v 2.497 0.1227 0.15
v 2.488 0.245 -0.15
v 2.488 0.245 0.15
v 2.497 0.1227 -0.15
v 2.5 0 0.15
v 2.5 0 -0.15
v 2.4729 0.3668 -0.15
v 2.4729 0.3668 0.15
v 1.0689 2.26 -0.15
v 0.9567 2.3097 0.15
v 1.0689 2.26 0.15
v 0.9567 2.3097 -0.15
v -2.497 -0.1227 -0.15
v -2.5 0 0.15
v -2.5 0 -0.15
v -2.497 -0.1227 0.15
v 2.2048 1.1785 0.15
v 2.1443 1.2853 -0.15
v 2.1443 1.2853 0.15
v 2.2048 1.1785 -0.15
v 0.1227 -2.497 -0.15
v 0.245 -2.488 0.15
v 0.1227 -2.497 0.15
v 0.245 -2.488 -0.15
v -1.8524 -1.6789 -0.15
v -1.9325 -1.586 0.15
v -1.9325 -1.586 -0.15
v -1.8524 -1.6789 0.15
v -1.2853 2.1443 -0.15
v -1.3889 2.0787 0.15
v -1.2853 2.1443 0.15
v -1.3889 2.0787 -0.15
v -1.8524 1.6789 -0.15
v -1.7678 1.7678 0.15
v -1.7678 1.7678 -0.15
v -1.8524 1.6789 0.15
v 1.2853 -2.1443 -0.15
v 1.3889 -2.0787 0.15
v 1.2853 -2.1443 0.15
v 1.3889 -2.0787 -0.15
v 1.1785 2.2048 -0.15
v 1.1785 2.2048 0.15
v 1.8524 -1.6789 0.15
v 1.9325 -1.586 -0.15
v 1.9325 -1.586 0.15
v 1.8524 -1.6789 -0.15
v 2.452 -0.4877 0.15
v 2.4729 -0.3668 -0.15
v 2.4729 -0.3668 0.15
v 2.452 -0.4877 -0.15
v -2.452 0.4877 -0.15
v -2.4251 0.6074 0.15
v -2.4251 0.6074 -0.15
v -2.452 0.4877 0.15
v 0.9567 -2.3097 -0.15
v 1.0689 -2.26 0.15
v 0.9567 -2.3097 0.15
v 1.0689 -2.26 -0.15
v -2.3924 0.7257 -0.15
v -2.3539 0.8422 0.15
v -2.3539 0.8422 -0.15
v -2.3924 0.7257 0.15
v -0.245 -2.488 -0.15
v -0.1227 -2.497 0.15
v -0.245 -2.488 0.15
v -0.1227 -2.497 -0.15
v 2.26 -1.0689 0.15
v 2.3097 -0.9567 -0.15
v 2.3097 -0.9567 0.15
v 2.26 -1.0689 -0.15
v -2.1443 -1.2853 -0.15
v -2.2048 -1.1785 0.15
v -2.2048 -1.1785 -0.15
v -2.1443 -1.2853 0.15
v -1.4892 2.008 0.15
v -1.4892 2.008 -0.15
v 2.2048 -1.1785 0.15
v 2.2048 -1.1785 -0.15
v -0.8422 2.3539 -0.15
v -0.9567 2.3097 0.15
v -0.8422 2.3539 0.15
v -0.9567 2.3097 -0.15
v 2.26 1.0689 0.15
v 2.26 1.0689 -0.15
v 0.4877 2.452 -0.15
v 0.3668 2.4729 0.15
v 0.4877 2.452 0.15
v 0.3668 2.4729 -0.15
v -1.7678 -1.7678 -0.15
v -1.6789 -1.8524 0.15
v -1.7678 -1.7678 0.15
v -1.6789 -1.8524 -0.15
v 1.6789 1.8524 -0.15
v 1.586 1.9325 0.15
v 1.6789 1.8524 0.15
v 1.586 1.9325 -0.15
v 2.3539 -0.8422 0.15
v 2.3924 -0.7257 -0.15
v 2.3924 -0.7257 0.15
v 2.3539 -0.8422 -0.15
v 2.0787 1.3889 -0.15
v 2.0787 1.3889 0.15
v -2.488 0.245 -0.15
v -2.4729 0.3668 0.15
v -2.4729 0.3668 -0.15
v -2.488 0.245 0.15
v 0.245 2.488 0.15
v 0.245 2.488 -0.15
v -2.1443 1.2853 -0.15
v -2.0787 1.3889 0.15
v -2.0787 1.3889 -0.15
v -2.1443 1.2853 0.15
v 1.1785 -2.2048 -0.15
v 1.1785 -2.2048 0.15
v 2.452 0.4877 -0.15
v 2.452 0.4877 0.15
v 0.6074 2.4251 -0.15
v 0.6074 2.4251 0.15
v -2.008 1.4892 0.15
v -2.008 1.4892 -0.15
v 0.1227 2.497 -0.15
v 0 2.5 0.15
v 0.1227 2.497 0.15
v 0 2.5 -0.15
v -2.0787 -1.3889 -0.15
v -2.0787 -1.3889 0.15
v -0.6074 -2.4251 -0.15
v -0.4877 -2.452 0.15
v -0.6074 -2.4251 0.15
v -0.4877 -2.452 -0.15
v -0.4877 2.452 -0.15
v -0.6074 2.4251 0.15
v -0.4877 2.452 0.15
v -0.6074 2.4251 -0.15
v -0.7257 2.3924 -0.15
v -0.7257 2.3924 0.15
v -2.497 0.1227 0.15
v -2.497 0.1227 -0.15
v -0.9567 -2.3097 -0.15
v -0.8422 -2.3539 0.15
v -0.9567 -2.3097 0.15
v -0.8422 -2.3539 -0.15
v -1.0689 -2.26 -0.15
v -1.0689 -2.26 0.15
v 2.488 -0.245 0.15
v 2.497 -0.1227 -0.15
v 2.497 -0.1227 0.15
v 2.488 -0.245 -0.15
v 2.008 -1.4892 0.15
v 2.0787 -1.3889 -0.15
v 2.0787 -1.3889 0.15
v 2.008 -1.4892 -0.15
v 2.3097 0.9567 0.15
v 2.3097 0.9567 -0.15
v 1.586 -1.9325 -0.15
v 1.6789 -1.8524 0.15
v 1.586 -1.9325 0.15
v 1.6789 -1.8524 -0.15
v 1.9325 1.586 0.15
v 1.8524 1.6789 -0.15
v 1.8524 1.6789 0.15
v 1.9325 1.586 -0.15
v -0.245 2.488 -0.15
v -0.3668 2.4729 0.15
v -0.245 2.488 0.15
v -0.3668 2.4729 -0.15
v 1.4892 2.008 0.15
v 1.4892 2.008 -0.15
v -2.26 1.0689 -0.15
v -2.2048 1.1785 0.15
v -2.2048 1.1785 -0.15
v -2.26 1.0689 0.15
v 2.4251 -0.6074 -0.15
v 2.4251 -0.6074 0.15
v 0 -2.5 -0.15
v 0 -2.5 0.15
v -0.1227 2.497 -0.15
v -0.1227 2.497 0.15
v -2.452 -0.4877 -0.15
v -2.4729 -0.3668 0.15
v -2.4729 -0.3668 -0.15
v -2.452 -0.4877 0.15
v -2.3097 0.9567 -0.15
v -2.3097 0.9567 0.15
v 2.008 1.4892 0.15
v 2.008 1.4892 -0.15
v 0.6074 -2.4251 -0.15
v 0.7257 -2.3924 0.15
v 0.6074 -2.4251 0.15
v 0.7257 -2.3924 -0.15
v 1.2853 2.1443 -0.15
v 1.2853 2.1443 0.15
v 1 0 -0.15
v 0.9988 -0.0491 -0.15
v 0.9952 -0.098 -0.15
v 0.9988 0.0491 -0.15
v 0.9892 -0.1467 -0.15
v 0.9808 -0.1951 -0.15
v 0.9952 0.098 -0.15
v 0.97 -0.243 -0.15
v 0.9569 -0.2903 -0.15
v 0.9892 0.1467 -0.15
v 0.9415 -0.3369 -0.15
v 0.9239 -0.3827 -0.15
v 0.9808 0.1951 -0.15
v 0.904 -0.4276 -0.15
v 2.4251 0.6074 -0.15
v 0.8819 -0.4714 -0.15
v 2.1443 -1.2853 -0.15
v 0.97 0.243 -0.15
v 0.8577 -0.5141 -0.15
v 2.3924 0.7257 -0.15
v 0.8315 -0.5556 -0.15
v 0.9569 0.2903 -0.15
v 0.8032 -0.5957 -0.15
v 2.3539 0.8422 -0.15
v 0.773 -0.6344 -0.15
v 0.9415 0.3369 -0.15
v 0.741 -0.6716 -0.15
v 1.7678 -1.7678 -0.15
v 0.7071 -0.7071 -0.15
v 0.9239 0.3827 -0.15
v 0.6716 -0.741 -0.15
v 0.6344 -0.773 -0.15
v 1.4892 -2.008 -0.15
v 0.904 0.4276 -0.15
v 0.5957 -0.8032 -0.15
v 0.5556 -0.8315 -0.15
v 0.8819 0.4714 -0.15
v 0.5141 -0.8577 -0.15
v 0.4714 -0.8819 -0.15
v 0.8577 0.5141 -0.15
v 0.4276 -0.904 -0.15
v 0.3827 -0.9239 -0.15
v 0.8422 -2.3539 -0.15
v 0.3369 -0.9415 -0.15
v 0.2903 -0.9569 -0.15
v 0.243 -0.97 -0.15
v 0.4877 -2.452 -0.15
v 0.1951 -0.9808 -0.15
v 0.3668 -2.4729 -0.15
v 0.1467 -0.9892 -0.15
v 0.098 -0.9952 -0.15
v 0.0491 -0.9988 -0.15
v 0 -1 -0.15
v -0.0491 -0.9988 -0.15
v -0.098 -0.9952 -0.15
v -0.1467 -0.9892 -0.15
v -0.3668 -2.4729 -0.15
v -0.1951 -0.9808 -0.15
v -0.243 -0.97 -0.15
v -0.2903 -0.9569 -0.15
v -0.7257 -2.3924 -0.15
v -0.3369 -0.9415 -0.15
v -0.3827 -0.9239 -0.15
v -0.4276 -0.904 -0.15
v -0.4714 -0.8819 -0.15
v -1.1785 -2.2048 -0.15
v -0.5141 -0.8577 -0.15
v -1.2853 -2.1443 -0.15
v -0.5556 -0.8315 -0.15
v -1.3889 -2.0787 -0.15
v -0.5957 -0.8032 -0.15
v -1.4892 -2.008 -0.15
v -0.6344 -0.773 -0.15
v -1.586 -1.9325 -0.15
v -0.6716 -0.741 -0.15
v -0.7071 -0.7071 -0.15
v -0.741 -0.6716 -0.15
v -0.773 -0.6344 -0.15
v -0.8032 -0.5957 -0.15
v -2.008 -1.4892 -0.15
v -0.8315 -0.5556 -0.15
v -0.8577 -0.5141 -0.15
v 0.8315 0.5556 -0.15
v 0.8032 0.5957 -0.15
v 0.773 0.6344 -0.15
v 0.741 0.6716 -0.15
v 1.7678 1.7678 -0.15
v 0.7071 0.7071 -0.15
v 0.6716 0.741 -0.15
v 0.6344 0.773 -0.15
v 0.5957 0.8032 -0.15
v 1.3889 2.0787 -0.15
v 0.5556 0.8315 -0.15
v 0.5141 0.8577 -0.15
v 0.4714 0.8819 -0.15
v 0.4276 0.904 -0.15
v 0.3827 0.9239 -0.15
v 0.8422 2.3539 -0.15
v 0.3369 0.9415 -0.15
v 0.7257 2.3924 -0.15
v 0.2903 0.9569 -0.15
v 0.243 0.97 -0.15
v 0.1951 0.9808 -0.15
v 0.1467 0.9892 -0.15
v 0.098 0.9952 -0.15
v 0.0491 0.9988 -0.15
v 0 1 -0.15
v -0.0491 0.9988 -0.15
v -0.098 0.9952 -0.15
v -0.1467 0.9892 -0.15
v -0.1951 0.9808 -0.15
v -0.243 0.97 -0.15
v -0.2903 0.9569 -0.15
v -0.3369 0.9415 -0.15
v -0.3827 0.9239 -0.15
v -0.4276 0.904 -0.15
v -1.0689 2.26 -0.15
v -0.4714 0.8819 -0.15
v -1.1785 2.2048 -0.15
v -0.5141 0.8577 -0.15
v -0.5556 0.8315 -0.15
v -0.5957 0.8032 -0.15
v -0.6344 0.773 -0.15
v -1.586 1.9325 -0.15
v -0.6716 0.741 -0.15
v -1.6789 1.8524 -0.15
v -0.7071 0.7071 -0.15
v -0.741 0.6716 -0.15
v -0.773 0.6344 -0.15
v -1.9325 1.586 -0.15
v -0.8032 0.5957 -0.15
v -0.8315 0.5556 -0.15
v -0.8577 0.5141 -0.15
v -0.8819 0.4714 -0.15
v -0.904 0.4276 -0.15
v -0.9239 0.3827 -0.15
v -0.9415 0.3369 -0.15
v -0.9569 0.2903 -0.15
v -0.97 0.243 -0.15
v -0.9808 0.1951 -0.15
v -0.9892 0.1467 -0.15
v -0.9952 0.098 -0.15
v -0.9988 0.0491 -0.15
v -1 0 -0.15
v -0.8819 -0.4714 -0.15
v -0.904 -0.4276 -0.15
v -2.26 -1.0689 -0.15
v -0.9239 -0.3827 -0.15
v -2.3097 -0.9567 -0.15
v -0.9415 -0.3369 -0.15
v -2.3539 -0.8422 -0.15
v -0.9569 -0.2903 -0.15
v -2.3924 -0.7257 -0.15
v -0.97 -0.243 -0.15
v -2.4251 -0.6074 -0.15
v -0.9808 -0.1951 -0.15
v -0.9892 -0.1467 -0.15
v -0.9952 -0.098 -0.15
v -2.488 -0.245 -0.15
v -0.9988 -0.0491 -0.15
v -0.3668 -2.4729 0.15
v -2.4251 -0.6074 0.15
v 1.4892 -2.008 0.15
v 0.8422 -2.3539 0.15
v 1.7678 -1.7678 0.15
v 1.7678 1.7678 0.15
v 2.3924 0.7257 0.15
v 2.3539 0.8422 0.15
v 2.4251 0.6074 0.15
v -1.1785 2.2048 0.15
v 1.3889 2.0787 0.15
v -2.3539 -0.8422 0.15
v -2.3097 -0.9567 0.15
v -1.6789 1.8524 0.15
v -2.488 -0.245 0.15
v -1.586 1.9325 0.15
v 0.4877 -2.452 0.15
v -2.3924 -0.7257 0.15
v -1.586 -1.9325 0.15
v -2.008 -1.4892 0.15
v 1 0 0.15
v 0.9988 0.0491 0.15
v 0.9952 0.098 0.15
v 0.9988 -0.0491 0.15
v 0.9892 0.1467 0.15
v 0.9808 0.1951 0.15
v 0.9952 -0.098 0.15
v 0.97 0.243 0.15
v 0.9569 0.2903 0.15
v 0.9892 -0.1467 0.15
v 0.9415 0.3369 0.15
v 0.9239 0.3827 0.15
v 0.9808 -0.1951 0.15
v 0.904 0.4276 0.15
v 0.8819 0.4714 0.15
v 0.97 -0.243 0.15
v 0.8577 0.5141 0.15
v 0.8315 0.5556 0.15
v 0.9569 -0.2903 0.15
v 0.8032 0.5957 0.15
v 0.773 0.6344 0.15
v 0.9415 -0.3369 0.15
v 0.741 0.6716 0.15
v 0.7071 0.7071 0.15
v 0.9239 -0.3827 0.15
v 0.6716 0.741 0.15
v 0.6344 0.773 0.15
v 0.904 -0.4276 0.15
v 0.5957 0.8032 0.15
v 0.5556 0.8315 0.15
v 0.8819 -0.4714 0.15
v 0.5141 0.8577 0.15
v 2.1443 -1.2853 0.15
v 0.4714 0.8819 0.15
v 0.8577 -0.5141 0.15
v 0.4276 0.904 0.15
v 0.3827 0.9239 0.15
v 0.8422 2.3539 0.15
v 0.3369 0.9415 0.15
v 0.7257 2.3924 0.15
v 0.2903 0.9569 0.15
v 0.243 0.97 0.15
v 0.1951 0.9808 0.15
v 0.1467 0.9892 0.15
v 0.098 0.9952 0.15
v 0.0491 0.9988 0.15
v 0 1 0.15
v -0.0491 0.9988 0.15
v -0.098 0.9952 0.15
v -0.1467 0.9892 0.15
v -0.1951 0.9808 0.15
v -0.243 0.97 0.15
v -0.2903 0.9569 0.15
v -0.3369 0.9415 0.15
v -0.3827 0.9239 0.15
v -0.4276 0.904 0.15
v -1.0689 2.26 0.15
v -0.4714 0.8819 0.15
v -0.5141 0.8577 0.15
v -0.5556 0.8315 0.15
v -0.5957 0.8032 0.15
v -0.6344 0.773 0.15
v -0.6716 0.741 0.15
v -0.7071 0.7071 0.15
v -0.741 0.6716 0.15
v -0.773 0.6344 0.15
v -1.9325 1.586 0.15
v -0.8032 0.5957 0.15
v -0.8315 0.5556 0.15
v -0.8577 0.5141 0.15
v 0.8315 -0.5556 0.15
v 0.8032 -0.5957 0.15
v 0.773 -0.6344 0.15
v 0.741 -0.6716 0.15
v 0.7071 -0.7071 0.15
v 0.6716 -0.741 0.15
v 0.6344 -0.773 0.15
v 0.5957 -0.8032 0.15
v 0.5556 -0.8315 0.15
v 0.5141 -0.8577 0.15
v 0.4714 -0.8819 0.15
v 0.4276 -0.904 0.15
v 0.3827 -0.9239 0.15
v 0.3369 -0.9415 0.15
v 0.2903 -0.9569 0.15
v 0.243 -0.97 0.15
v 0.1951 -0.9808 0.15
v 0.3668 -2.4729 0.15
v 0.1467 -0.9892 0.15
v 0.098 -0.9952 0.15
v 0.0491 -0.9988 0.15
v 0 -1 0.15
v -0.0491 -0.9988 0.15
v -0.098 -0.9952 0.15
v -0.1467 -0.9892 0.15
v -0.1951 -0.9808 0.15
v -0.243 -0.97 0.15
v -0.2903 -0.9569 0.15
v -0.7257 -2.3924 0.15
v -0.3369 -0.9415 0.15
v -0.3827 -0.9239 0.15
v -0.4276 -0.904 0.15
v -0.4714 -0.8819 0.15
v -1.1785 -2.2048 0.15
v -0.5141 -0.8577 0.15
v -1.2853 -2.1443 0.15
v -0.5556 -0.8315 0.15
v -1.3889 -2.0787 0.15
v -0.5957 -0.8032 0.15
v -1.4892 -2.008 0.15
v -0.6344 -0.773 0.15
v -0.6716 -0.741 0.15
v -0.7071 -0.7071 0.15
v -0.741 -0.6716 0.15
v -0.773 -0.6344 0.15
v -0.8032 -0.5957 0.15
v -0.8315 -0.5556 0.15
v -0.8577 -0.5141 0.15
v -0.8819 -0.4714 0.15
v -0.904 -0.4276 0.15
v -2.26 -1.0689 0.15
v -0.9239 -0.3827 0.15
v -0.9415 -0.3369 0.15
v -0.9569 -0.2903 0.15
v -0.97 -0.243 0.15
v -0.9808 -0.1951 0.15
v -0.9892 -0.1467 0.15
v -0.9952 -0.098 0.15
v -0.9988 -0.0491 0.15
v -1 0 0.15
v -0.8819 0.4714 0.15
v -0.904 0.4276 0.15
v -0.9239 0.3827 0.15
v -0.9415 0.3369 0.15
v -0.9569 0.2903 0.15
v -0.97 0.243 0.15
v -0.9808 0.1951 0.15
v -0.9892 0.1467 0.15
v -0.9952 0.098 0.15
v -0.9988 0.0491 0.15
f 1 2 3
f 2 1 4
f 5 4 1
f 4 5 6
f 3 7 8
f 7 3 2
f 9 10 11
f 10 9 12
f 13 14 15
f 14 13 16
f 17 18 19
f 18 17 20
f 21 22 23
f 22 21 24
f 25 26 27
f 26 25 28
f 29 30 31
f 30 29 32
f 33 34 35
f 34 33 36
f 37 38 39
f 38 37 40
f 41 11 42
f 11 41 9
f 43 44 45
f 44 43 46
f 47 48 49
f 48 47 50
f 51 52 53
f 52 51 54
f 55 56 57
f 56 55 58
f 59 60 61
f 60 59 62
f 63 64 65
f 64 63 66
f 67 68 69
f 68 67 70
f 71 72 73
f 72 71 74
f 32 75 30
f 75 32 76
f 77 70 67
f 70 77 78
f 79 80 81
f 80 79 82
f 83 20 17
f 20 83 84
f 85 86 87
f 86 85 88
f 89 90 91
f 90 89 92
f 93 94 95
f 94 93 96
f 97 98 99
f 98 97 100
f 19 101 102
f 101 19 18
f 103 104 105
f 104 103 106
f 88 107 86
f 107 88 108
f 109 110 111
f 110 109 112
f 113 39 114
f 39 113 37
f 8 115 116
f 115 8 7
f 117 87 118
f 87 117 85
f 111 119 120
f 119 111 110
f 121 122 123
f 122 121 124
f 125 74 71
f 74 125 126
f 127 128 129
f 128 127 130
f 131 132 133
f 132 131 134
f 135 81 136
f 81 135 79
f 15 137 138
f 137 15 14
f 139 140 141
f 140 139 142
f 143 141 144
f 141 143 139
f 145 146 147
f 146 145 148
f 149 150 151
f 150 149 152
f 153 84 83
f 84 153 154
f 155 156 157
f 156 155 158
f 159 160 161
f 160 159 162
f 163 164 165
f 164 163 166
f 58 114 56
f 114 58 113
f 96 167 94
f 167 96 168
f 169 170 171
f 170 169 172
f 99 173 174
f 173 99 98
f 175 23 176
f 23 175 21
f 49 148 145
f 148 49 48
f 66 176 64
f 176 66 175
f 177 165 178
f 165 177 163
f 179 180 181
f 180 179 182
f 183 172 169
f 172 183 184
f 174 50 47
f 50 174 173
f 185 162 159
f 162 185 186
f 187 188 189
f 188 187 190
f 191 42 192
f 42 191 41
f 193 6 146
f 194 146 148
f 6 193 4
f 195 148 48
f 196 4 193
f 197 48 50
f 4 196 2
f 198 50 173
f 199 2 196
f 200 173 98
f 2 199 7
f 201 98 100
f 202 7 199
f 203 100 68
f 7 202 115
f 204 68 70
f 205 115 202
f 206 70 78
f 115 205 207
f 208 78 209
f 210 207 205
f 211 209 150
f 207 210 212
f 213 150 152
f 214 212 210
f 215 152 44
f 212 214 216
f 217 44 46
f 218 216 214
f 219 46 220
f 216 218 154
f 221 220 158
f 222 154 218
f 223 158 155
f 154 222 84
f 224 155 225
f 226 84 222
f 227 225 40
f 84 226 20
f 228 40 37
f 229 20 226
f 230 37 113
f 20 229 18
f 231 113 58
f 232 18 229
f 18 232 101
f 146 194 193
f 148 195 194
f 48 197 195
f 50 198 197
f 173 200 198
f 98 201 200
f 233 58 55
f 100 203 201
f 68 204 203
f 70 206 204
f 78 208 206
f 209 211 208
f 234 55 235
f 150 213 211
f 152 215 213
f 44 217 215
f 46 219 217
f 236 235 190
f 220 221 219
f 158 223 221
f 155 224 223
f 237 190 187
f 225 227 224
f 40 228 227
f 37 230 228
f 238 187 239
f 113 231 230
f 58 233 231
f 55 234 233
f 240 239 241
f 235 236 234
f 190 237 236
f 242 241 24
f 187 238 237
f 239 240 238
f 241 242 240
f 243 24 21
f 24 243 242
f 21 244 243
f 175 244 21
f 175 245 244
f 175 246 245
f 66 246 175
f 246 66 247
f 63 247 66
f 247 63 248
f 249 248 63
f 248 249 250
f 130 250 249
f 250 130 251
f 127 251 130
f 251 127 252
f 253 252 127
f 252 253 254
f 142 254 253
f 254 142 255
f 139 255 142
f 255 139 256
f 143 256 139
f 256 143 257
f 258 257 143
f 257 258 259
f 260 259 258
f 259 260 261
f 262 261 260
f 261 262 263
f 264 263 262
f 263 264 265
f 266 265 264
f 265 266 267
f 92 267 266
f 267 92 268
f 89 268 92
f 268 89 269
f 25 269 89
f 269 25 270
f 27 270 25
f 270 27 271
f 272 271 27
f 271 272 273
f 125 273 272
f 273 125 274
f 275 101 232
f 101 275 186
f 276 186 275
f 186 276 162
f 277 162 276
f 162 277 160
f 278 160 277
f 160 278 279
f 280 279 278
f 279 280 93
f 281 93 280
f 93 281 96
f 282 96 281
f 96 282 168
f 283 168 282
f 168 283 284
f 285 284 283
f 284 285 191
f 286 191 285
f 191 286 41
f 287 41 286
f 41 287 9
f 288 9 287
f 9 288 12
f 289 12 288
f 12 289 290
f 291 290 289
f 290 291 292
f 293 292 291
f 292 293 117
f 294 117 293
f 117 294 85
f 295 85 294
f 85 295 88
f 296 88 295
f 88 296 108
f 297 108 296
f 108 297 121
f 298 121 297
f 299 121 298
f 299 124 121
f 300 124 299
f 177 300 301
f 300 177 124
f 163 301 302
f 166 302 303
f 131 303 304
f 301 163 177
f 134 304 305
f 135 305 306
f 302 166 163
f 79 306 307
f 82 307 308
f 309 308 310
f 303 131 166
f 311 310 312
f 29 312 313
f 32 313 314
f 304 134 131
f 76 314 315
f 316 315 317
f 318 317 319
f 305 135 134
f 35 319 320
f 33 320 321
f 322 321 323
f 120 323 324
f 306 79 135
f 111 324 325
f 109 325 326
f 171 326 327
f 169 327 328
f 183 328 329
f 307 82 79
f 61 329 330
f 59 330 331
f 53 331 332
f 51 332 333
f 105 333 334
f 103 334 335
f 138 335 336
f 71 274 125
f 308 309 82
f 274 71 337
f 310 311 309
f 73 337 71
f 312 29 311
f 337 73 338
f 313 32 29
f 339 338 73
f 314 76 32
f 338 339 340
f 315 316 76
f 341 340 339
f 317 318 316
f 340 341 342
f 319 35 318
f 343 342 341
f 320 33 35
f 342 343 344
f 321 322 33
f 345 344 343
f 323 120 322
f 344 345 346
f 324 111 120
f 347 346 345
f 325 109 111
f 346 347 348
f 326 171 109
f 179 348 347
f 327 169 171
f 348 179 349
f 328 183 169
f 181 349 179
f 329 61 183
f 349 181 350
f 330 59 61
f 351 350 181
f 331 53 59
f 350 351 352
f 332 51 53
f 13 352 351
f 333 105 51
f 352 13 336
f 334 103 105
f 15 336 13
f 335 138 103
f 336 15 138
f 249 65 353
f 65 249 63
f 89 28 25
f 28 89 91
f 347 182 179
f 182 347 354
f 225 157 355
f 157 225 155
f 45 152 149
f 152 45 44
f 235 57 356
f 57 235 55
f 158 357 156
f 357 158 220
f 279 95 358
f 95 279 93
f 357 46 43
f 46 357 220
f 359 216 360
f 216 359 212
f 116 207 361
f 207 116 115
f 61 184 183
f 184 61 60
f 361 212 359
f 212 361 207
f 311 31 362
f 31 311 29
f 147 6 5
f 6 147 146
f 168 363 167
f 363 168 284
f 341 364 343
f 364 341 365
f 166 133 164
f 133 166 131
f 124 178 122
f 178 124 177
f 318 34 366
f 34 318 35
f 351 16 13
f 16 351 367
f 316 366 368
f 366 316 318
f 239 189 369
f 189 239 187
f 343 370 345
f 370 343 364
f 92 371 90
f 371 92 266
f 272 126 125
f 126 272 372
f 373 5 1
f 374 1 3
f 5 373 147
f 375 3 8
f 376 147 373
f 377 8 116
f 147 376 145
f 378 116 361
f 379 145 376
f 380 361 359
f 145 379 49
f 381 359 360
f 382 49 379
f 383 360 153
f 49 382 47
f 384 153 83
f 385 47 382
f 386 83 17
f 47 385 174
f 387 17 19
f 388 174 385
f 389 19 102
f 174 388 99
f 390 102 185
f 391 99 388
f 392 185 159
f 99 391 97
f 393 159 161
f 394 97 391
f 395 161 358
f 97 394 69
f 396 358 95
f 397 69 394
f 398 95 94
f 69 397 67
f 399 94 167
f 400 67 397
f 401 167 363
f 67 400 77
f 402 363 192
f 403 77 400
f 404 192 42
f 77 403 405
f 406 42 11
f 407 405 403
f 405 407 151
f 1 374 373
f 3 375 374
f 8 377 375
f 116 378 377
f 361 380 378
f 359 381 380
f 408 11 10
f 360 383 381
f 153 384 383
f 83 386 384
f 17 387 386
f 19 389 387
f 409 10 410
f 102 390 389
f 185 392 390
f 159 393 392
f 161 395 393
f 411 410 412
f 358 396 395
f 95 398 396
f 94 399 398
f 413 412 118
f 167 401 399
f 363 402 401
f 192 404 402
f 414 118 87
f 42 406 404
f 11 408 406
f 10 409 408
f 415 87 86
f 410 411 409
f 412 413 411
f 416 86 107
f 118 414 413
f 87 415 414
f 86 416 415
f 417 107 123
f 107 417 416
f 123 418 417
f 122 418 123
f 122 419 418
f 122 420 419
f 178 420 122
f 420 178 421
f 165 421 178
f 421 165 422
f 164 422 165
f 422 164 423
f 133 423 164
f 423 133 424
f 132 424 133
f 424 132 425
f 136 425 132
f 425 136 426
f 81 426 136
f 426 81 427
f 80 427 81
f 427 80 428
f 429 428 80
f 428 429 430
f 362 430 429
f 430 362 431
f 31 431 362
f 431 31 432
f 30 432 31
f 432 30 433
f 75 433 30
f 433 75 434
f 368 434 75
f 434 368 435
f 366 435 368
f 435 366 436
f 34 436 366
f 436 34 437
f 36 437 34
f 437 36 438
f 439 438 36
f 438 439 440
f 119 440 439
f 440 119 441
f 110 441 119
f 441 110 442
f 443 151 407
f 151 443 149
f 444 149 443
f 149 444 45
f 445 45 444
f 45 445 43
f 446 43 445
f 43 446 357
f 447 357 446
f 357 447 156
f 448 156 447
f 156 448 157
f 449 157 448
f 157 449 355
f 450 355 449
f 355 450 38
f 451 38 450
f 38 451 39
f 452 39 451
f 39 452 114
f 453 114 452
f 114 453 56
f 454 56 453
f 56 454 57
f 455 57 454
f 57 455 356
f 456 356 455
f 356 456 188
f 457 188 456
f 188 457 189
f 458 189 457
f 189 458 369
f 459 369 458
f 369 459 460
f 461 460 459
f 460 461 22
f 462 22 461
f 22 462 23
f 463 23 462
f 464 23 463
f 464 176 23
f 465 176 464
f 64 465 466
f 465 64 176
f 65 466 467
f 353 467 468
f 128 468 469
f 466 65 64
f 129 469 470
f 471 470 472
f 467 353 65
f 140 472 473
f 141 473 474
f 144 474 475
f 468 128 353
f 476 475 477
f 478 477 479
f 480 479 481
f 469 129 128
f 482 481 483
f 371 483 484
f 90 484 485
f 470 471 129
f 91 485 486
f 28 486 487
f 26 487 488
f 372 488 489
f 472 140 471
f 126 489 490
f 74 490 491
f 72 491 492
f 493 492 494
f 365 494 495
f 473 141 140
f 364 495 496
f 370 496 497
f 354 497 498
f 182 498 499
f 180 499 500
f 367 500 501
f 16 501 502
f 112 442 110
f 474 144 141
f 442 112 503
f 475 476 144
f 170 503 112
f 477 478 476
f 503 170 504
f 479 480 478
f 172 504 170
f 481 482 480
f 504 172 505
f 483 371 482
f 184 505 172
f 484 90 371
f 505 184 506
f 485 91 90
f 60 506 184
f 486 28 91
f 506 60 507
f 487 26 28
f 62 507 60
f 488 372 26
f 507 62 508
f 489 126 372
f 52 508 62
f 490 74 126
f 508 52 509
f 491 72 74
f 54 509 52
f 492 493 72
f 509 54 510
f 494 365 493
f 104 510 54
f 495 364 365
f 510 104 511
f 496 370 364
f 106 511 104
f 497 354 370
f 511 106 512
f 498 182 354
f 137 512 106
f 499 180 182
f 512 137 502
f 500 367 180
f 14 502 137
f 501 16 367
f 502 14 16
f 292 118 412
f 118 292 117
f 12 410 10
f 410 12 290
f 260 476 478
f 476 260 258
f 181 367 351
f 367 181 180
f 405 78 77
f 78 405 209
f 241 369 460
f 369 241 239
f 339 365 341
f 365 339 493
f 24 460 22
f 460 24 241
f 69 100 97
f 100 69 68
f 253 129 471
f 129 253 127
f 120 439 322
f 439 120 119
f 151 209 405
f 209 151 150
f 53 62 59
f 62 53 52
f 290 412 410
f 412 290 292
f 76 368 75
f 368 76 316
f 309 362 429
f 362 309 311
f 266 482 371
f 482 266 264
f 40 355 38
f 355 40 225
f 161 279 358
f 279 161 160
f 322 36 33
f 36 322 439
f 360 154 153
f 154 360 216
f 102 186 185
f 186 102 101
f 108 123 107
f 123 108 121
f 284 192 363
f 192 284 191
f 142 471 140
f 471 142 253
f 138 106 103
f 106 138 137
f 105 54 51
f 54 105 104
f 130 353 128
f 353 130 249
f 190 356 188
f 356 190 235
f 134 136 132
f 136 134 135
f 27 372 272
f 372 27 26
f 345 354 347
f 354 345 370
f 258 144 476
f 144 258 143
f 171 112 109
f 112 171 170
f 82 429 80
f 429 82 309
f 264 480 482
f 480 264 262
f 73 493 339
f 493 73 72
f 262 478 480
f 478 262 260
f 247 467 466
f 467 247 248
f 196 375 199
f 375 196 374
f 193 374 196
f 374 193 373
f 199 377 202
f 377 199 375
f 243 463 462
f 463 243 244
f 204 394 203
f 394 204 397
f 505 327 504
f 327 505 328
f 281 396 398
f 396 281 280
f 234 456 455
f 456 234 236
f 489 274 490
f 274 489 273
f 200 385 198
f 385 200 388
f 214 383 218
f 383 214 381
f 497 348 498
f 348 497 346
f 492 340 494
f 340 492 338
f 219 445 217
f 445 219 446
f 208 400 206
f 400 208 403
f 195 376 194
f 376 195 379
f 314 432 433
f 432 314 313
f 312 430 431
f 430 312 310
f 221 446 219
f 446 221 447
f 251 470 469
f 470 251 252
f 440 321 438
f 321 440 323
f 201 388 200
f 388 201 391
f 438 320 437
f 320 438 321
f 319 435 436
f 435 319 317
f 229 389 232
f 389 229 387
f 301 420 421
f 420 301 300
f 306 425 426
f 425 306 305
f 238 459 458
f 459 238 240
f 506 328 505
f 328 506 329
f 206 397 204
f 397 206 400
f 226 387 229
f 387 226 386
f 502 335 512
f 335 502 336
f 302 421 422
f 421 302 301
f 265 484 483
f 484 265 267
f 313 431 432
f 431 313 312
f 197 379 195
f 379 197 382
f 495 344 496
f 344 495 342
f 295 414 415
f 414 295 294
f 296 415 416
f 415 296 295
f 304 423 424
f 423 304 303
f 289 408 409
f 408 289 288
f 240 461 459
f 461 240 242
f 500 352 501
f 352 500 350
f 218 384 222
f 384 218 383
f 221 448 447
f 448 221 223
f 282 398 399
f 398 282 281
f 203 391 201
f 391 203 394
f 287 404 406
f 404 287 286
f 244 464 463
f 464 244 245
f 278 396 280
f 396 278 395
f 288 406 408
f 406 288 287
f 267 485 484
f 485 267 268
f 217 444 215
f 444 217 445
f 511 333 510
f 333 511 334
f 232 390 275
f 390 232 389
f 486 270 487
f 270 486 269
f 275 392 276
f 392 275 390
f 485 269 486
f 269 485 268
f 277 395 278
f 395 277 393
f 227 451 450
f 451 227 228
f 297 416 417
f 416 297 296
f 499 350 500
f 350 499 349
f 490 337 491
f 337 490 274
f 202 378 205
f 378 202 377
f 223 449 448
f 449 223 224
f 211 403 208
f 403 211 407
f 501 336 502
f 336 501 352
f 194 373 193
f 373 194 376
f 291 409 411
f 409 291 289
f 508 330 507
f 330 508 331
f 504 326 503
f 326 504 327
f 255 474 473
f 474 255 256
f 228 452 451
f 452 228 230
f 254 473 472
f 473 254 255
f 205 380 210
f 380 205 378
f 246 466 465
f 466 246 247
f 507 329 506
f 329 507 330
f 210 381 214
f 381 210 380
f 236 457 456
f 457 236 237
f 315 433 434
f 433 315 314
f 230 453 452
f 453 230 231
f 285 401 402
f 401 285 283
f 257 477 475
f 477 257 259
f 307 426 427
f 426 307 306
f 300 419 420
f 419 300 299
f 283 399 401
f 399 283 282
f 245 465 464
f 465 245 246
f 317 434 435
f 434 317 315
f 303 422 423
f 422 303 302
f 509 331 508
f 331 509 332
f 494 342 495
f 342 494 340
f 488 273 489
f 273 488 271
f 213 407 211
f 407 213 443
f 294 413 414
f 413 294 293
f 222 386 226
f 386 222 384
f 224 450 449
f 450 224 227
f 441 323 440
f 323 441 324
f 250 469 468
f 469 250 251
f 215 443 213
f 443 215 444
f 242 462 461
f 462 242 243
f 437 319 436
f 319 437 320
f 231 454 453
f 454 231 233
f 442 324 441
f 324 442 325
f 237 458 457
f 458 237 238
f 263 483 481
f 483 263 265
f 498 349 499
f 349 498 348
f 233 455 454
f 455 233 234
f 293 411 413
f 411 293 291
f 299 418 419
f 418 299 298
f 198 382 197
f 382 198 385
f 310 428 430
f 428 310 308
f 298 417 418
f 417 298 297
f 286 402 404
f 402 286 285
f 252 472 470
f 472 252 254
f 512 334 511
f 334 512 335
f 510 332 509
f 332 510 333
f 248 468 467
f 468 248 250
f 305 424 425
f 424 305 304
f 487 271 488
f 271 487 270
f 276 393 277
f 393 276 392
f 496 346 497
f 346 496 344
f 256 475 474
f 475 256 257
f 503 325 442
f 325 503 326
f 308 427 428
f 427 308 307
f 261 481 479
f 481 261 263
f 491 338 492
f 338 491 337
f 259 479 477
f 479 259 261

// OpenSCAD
// Flat washer: 2.0mm ID, 5.0mm OD, 0.3mm thickness

inner_diameter_mm = 2.0;
outer_diameter_mm = 5.0;
thickness_mm      = 0.3;

// Small extra height for clean boolean subtraction (not part of final dimensions)
cut_extra_mm = 0.2;

// Smooth circular appearance
$fn = 128;

module flat_washer(id_mm, od_mm, t_mm) {
    difference() {
        cylinder(d = od_mm, h = t_mm, center = true);
        cylinder(d = id_mm, h = t_mm + 2*cut_extra_mm, center = true);
    }
}

flat_washer(inner_diameter_mm, outer_diameter_mm, thickness_mm);
